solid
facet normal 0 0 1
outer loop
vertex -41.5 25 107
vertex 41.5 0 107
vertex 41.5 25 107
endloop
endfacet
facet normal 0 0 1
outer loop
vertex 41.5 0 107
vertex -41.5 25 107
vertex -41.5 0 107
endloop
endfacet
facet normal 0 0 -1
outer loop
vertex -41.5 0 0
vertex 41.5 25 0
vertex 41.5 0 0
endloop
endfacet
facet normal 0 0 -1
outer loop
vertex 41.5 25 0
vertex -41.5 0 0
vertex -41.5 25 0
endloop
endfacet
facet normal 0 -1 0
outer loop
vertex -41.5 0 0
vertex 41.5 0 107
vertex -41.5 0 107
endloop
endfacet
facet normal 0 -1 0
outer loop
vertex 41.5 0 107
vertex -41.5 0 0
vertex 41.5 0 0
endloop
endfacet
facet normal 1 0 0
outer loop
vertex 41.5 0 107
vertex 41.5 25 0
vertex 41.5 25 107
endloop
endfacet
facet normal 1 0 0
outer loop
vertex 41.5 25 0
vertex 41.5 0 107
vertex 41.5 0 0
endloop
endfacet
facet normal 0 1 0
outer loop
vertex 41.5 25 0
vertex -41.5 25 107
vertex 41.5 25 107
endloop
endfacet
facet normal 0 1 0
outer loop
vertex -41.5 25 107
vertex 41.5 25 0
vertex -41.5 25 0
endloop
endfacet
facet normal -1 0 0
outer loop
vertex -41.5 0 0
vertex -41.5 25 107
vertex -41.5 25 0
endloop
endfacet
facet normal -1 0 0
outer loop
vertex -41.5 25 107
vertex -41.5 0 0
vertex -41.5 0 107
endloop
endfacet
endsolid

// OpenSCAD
//:Model "Fit" [0.15,0.15,0.15]
//:Mass 231
module fit()
{
    color([0.15,0.15,0.15])
    translate([-83/2,0,0])
        cube([83, 25, 107]);
}

fit();
